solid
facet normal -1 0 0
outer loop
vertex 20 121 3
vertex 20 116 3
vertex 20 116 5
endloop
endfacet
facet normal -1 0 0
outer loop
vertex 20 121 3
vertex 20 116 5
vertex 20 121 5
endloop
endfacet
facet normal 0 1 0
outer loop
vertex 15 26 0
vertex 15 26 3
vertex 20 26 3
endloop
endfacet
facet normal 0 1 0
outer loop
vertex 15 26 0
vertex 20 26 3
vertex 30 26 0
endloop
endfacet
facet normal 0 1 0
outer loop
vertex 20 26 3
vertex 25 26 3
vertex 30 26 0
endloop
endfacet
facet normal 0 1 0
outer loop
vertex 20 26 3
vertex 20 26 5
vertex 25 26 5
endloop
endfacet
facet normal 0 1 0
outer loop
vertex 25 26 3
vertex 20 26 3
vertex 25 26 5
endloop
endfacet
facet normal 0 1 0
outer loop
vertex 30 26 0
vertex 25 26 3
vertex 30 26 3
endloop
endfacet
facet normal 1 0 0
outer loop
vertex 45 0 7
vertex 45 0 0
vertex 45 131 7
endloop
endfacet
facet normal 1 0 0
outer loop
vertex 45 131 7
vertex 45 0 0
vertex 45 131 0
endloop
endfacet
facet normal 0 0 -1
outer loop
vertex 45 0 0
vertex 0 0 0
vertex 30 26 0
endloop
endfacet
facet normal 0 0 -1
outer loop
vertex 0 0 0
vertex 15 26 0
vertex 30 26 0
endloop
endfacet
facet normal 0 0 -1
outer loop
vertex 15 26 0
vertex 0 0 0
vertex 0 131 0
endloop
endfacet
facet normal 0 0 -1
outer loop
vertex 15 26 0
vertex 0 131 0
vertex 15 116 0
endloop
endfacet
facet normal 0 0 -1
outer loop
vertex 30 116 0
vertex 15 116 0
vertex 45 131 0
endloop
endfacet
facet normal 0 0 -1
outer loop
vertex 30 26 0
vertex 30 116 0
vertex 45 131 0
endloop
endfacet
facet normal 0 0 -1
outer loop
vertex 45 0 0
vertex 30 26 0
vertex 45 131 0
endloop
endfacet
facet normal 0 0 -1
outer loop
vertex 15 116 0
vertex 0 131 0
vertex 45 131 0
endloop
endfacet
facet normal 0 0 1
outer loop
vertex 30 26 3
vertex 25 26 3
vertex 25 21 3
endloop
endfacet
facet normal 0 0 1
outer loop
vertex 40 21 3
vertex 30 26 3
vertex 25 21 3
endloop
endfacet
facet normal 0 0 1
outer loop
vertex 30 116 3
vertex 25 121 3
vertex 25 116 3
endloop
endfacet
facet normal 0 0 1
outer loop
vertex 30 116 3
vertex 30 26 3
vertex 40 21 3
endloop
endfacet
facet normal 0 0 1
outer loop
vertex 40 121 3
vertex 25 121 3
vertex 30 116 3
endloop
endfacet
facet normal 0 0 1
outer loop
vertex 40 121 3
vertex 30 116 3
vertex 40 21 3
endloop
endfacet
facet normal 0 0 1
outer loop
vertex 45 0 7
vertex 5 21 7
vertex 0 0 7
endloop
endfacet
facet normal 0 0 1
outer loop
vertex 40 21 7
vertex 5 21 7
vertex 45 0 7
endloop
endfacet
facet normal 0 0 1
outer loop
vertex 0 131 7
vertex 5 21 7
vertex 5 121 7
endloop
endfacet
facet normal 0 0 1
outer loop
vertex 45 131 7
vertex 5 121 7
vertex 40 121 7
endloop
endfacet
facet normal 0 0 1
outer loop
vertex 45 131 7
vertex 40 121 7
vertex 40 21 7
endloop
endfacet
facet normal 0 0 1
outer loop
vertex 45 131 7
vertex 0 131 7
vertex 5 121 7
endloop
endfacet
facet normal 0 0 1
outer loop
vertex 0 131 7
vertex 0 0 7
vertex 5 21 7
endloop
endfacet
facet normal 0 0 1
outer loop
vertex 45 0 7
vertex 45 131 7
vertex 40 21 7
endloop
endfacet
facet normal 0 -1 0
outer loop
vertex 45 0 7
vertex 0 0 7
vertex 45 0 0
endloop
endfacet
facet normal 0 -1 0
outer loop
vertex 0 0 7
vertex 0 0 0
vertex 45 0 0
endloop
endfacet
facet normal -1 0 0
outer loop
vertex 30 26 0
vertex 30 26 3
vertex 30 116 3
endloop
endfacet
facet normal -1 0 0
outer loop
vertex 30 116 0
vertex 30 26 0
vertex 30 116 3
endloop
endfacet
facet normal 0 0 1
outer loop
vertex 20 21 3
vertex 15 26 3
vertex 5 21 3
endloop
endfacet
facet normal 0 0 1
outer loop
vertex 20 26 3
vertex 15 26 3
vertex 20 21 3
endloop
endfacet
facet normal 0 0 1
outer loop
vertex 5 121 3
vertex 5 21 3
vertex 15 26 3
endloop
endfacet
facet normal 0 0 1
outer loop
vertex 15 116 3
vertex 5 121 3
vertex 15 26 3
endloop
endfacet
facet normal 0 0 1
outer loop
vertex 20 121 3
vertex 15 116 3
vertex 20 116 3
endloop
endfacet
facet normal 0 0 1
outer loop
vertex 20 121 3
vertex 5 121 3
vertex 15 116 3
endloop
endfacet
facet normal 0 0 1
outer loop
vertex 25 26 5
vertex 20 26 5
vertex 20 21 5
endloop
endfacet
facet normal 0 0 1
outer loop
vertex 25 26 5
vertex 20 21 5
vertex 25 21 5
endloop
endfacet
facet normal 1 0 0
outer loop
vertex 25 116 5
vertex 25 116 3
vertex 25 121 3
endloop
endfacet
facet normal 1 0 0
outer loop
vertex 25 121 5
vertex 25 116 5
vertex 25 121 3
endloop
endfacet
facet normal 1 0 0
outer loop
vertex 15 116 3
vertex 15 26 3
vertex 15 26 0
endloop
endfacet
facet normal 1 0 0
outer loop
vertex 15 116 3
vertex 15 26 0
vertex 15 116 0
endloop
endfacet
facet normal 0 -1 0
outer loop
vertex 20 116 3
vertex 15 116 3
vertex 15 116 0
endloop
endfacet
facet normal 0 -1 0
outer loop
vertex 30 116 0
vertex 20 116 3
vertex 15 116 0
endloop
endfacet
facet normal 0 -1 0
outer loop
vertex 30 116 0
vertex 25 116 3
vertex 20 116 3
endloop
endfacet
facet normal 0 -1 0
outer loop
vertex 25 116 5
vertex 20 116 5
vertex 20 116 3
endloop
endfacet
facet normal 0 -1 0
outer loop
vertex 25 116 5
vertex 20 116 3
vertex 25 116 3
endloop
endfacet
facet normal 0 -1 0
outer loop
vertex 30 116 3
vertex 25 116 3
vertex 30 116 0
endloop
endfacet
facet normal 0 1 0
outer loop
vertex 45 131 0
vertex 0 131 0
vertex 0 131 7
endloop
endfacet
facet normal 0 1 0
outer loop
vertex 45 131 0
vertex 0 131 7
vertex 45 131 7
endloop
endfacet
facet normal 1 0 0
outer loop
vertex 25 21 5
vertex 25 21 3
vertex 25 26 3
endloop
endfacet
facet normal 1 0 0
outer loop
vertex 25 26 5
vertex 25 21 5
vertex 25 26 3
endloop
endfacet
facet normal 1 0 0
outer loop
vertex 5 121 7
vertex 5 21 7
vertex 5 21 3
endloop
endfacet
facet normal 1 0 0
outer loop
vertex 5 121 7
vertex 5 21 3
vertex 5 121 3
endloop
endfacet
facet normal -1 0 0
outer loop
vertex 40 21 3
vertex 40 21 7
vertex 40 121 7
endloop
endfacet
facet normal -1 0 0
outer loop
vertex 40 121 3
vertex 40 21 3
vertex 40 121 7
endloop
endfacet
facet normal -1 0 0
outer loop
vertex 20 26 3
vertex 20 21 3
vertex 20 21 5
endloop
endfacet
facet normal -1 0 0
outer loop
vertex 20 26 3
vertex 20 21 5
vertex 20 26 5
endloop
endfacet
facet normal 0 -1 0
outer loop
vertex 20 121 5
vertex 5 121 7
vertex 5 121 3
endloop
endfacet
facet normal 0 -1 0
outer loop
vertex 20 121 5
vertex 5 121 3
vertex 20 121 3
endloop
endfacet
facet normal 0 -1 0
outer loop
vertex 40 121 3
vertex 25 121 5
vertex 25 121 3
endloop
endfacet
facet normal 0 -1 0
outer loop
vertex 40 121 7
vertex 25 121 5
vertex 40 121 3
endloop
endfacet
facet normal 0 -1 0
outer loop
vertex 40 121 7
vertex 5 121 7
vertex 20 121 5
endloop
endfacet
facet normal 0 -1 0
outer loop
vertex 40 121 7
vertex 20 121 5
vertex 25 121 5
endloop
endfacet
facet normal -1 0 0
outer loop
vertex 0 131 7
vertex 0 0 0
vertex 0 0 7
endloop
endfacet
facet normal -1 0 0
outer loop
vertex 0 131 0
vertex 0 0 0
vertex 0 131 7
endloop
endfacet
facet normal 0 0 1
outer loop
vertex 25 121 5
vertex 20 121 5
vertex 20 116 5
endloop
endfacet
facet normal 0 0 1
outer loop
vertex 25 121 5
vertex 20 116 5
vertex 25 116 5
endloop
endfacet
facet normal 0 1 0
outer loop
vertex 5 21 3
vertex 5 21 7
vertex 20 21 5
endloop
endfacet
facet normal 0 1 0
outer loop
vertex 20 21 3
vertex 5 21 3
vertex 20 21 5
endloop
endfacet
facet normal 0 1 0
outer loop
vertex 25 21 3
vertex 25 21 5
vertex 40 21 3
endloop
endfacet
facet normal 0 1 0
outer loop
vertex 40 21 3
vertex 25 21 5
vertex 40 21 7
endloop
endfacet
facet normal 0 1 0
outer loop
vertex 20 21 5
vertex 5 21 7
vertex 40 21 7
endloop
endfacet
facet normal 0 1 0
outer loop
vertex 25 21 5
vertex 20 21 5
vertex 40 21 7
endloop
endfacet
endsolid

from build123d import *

# Parameters (mm, degrees)
F0_W     = 45
F0_H     = 131
F1_DEPTH = 2
F2_W     = 45
F2_H     = 131
F3_DEPTH = 5
F5_W     = 35
F5_H     = 100
F6_DEPTH = 4
F7_W     = 5
F7_H     = 100
F8_DEPTH = 2
F4_W     = 15
F4_H     = 90
F9_DEPTH = 7.001


with BuildPart() as f1:
    # F0 (on Top) → F1 (new body)
    with BuildSketch(Plane.XY):
        with Locations((22.5, 65.5)):
            Rectangle(F0_W, F0_H)
    extrude(amount=F1_DEPTH)

    # F2 (on face) → F3 (join)
    with BuildSketch(Plane.XY.offset(2)):
        with Locations((22.5, 65.5)):
            Rectangle(F2_W, F2_H)
    extrude(amount=F3_DEPTH)

    # F5 (on face) → F6 (cut)
    with BuildSketch(Plane.XY.offset(7)):
        with Locations((22.5, 71)):
            Rectangle(F5_W, F5_H)
    extrude(amount=-F6_DEPTH, mode=Mode.SUBTRACT)

    # F7 (on face) → F8 (join)
    with BuildSketch(Plane.XY.offset(3)):
        with Locations((22.5, 71)):
            Rectangle(F7_W, F7_H)
    extrude(amount=F8_DEPTH)

    # F4 (on face) → F9 (cut, through all)
    with BuildSketch(Plane.XY.offset(7)):
        with Locations((22.5, 71)):
            Rectangle(F4_W, F4_H)
    extrude(amount=-F9_DEPTH, mode=Mode.SUBTRACT)


solid = f1.part
